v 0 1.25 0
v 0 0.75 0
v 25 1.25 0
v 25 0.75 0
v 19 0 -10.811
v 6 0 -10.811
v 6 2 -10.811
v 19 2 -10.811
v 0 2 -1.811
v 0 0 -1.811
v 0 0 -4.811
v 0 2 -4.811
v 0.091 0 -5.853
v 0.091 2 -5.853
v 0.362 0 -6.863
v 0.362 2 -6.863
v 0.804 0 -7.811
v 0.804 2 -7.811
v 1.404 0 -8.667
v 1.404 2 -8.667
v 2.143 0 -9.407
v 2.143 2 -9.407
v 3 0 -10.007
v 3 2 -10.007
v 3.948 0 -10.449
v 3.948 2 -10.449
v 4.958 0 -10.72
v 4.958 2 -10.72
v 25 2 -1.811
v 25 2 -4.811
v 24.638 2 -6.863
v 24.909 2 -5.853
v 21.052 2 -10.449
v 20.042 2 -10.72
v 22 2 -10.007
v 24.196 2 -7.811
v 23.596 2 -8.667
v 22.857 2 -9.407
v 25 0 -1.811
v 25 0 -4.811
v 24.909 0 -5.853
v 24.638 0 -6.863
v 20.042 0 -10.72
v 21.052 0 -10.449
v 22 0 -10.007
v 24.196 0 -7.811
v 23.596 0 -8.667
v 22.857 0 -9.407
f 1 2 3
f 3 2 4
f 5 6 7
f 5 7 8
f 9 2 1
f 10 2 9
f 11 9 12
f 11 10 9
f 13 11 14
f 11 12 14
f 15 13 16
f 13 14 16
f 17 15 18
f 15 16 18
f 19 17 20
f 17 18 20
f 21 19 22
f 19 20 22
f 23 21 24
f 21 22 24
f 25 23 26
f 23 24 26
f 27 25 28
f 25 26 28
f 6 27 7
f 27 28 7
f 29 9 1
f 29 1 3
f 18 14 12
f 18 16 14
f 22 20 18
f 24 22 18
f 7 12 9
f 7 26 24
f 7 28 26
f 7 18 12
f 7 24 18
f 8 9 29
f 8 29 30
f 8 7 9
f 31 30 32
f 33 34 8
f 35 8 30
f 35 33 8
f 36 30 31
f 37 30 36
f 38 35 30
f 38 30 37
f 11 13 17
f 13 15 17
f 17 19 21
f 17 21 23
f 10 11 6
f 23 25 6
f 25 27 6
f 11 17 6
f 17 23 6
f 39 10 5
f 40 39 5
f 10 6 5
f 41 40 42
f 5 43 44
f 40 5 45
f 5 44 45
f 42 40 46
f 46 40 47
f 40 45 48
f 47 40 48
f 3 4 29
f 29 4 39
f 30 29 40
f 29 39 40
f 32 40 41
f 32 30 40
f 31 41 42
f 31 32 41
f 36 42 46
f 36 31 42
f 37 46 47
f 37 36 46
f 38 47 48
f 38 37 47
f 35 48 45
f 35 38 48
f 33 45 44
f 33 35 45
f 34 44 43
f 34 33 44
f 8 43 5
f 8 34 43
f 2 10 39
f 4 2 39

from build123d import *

# Parameters (mm, degrees)
PROFILE_SKETCH_W         = 25
PROFILE_SKETCH_H         = 10.810660172
THICKNESS_EXTRUDE_DEPTH  = 2
FILLETS_R                = 6
CONNECTION_CHAMFER_SIZE  = 0.75
CONNECTION_CHAMFER_SIZE2 = 1.810660172


with BuildPart() as part:
    # Profile Sketch → Thickness Extrude (new body)
    with BuildSketch(Plane(origin=(0, 0, 0), x_dir=(1, 0, 0), z_dir=(0, 1, 0))):
        with Locations((12.5, 5.405330086)):
            Rectangle(PROFILE_SKETCH_W, PROFILE_SKETCH_H)
    extrude(amount=THICKNESS_EXTRUDE_DEPTH)

    # Fillets
    fillets_edges = [part.edges().sort_by_distance(p)[0] for p in [
        (0, 1, -10.810660172),
        (25, 1, -10.810660172),
    ]]
    fillet(fillets_edges, radius=FILLETS_R)

    # Connection Chamfer
    connection_chamfer_edges = [part.edges().sort_by_distance(p)[0] for p in [
        (12.5, 0, 0),
        (12.5, 2, 0),
    ]]
    connection_chamfer_side = [part.faces().sort_by_distance(p)[0] for p in [
        (12.5, 1, 0),
    ]]
    chamfer(connection_chamfer_edges, length=CONNECTION_CHAMFER_SIZE, length2=CONNECTION_CHAMFER_SIZE2, reference=connection_chamfer_side[0])


solid = part.part
